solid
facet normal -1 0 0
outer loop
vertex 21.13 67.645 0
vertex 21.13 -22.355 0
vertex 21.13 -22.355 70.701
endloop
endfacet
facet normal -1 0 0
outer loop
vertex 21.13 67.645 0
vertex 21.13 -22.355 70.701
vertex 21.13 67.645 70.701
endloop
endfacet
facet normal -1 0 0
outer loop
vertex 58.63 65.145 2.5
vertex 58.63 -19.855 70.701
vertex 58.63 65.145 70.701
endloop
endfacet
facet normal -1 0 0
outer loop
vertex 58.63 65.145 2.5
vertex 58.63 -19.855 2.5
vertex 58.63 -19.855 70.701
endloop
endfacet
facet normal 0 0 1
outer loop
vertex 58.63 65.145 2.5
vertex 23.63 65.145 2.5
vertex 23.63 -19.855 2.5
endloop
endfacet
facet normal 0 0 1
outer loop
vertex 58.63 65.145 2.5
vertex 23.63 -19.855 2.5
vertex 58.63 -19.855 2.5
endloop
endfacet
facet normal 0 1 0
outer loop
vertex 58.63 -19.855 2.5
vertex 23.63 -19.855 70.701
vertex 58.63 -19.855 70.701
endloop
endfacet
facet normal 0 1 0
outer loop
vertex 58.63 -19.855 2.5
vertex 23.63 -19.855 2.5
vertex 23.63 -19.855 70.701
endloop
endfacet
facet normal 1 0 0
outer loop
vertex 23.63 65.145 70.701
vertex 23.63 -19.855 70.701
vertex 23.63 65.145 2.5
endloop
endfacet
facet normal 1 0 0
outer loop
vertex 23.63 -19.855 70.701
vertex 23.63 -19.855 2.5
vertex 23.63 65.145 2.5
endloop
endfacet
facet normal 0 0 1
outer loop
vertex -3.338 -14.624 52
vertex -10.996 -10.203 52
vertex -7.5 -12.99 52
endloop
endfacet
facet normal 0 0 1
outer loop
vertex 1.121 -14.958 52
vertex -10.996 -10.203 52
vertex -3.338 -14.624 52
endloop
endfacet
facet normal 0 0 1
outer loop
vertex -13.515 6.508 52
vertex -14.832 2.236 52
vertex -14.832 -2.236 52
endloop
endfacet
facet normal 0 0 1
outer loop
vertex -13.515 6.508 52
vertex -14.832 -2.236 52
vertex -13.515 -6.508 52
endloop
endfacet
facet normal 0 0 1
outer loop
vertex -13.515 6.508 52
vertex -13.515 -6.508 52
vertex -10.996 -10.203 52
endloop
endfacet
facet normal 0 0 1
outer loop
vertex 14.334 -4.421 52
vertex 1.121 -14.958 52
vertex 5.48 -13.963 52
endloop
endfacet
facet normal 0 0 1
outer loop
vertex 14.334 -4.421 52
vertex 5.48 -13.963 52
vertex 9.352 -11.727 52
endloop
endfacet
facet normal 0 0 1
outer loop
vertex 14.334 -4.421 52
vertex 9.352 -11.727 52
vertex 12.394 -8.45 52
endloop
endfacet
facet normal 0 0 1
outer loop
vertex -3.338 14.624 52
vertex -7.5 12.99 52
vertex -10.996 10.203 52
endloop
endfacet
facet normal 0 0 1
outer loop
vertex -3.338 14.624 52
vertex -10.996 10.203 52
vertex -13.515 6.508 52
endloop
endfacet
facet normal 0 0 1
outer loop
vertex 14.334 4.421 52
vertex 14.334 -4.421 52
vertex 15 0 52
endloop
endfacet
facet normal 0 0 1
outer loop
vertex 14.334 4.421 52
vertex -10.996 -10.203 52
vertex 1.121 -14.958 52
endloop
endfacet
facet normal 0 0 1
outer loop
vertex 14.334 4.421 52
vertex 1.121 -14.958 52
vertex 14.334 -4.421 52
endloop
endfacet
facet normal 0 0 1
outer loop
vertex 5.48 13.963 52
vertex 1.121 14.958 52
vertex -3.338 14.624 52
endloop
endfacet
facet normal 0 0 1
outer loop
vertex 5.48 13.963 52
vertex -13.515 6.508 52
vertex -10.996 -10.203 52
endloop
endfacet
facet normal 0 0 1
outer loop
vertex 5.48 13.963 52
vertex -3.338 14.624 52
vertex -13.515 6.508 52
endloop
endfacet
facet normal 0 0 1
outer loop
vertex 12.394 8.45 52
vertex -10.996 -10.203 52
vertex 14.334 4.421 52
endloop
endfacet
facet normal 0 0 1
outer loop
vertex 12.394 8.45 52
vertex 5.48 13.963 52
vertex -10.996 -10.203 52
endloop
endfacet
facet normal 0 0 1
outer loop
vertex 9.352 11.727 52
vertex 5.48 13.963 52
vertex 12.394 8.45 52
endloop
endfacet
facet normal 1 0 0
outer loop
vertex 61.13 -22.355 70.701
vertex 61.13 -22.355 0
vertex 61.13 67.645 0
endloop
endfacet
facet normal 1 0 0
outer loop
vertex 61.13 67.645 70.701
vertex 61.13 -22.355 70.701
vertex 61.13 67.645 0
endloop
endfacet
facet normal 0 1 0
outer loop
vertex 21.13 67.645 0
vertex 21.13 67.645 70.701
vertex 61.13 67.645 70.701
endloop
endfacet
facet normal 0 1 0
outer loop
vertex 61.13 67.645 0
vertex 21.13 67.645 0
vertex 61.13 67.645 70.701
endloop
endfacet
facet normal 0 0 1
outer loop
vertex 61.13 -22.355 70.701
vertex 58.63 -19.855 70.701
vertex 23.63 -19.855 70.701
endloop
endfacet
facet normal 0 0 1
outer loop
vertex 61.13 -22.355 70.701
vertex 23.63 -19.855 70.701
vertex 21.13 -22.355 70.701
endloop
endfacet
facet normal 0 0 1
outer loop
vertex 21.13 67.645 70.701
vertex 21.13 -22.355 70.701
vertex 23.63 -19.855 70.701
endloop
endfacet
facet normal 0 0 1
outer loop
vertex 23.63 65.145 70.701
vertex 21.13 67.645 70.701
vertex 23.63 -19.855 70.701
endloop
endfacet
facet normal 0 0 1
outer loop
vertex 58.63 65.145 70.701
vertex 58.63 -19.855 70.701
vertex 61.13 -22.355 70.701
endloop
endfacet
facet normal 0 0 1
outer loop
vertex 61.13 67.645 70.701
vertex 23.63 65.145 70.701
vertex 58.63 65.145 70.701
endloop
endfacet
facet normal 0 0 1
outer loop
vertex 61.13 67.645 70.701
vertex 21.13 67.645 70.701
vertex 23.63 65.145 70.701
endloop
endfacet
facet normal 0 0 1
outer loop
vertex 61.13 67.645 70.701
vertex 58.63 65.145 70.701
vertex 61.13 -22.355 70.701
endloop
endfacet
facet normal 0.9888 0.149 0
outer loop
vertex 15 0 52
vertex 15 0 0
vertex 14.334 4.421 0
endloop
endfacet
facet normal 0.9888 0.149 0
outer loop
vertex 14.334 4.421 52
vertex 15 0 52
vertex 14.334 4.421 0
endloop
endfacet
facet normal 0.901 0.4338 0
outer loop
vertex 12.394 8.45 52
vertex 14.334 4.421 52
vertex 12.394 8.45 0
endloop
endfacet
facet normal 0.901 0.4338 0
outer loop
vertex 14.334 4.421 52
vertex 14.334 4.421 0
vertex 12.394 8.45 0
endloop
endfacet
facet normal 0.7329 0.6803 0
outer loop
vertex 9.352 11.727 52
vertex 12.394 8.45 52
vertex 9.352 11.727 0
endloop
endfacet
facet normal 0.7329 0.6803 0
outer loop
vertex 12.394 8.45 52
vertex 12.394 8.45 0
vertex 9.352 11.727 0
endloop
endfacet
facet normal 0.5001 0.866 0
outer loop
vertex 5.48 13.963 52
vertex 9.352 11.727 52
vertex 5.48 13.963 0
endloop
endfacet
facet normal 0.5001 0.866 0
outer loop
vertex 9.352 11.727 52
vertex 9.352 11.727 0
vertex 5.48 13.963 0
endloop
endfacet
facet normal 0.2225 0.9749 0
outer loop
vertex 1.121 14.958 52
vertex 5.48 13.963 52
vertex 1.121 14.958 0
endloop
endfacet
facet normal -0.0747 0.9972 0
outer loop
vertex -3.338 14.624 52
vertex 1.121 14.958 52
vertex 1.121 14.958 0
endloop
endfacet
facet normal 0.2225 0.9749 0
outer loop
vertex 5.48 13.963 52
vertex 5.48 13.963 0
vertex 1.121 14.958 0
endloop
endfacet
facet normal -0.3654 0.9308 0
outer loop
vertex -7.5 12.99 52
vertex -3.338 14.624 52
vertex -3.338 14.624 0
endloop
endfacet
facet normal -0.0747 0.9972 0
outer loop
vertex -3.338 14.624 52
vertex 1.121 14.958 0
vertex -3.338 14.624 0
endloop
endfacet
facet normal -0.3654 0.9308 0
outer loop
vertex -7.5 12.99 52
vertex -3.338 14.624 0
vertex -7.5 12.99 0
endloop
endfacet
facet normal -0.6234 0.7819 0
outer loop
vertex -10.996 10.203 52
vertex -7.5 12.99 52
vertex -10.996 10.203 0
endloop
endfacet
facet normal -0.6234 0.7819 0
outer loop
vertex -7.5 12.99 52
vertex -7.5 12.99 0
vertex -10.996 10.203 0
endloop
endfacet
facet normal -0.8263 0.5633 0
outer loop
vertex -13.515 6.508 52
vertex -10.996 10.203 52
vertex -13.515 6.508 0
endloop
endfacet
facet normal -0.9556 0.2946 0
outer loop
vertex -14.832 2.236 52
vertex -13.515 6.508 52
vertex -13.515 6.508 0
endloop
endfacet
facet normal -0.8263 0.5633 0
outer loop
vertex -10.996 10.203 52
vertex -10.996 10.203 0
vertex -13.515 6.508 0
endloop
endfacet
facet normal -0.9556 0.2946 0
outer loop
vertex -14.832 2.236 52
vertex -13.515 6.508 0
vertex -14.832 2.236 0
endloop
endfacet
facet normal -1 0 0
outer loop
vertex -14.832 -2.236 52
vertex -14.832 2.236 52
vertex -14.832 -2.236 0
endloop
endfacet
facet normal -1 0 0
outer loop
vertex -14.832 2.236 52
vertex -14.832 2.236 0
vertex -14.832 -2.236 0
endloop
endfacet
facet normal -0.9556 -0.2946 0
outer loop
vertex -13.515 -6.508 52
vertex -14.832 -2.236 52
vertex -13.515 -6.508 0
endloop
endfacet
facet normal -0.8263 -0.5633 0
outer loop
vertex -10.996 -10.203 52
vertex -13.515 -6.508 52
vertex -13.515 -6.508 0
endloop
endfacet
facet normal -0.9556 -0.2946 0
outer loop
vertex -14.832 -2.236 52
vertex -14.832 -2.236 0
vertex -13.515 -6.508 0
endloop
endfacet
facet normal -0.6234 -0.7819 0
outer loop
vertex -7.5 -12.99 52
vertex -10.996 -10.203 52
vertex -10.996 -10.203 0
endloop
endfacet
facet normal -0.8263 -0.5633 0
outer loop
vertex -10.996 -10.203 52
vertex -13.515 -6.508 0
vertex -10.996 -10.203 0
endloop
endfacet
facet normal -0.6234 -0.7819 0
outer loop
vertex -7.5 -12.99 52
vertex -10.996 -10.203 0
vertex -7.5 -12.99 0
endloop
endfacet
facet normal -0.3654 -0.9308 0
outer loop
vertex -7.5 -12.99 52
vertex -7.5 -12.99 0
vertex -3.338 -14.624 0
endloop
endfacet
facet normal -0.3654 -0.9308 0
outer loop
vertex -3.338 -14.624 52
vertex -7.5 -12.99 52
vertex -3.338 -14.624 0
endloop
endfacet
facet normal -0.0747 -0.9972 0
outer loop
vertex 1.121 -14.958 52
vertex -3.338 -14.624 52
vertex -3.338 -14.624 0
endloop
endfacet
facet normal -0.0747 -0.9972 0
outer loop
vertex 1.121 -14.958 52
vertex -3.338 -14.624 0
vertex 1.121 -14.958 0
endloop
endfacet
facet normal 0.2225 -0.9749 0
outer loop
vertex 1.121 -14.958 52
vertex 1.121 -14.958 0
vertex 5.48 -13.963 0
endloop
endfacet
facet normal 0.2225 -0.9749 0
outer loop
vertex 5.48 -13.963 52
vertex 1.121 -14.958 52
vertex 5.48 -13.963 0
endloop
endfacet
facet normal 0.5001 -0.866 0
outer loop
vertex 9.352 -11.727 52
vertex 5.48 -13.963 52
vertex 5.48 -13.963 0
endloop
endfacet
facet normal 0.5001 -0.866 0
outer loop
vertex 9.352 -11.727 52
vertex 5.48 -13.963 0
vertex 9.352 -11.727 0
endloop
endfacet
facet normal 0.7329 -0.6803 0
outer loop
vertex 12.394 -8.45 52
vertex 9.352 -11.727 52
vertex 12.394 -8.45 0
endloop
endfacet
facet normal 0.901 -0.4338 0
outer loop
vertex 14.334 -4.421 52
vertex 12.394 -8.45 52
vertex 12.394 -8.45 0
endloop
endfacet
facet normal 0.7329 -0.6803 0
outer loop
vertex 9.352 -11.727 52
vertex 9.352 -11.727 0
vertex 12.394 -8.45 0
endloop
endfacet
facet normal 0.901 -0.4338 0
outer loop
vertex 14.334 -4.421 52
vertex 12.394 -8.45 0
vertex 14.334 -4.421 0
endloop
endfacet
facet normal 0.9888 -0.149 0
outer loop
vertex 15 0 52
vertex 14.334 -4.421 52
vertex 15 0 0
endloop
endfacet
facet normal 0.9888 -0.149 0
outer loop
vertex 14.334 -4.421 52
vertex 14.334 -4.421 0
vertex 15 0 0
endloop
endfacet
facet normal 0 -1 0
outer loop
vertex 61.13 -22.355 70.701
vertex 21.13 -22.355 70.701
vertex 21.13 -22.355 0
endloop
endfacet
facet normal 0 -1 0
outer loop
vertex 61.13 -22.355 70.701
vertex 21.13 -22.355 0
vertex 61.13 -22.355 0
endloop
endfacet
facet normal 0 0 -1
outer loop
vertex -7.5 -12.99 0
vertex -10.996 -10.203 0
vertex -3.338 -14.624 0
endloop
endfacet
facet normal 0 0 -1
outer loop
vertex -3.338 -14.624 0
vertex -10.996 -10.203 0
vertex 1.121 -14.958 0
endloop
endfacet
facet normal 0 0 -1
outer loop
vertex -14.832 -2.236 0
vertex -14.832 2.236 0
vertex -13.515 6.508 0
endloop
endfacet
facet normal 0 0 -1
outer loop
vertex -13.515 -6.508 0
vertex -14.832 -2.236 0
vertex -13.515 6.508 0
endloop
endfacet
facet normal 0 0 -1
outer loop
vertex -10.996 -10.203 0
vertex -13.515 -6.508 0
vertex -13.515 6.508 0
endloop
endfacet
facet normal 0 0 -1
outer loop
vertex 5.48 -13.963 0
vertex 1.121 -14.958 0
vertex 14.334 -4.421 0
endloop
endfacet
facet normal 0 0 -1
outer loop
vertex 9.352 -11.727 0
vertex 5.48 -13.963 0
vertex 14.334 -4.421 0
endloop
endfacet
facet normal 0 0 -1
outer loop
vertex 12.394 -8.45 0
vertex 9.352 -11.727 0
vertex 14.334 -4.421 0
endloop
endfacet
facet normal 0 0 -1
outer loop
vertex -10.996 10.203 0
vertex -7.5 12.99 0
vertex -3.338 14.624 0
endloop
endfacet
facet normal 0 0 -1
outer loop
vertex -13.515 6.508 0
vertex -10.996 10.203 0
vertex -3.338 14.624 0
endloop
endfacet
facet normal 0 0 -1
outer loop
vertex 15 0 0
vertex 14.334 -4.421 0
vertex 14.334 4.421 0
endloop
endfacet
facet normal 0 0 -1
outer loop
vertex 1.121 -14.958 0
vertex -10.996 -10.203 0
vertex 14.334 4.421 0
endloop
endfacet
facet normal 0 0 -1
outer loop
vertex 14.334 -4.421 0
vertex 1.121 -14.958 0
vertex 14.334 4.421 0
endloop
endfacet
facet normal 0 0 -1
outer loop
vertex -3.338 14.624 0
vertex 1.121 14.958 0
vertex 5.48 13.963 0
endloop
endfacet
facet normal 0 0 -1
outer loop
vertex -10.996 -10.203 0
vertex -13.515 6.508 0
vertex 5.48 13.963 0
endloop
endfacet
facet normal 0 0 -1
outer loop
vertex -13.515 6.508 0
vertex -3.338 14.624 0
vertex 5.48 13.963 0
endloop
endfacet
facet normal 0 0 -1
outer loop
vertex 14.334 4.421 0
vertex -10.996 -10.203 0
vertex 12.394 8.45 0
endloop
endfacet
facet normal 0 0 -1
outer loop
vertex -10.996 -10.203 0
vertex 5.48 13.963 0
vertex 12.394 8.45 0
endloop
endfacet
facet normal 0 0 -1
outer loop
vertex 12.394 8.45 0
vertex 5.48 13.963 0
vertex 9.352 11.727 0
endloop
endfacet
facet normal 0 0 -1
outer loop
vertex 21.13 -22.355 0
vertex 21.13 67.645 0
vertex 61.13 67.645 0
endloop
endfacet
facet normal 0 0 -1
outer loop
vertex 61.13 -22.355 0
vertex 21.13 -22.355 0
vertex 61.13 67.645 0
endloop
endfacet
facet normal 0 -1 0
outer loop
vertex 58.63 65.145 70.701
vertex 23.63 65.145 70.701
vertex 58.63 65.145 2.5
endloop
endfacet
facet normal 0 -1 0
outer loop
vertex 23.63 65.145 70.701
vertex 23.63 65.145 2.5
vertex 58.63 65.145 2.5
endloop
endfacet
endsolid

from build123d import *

# Parameters (mm, degrees)
F0_R     = 15
F1_DEPTH = 52
F2_W     = 40
F2_H     = 90
F3_DEPTH = 70.700936
F4_T     = -2.5


with BuildPart() as f1:
    # F0 (on Top) → F1 (new body)
    with BuildSketch(Plane.XY):
        Circle(F0_R)
    extrude(amount=F1_DEPTH)


with BuildPart() as f3:
    # F2 (on Top) → F3 (new body)
    with BuildSketch(Plane.XY):
        with Locations((41.130134, 22.645339)):
            Rectangle(F2_W, F2_H)
    extrude(amount=F3_DEPTH)

    # F4
    f4_openings = [f3.faces().sort_by_distance(p)[0] for p in [
        (41.130134, 22.645339, 70.700936),
    ]]
    offset(amount=F4_T, openings=f4_openings)


solid = Compound([f1.part, f3.part])
